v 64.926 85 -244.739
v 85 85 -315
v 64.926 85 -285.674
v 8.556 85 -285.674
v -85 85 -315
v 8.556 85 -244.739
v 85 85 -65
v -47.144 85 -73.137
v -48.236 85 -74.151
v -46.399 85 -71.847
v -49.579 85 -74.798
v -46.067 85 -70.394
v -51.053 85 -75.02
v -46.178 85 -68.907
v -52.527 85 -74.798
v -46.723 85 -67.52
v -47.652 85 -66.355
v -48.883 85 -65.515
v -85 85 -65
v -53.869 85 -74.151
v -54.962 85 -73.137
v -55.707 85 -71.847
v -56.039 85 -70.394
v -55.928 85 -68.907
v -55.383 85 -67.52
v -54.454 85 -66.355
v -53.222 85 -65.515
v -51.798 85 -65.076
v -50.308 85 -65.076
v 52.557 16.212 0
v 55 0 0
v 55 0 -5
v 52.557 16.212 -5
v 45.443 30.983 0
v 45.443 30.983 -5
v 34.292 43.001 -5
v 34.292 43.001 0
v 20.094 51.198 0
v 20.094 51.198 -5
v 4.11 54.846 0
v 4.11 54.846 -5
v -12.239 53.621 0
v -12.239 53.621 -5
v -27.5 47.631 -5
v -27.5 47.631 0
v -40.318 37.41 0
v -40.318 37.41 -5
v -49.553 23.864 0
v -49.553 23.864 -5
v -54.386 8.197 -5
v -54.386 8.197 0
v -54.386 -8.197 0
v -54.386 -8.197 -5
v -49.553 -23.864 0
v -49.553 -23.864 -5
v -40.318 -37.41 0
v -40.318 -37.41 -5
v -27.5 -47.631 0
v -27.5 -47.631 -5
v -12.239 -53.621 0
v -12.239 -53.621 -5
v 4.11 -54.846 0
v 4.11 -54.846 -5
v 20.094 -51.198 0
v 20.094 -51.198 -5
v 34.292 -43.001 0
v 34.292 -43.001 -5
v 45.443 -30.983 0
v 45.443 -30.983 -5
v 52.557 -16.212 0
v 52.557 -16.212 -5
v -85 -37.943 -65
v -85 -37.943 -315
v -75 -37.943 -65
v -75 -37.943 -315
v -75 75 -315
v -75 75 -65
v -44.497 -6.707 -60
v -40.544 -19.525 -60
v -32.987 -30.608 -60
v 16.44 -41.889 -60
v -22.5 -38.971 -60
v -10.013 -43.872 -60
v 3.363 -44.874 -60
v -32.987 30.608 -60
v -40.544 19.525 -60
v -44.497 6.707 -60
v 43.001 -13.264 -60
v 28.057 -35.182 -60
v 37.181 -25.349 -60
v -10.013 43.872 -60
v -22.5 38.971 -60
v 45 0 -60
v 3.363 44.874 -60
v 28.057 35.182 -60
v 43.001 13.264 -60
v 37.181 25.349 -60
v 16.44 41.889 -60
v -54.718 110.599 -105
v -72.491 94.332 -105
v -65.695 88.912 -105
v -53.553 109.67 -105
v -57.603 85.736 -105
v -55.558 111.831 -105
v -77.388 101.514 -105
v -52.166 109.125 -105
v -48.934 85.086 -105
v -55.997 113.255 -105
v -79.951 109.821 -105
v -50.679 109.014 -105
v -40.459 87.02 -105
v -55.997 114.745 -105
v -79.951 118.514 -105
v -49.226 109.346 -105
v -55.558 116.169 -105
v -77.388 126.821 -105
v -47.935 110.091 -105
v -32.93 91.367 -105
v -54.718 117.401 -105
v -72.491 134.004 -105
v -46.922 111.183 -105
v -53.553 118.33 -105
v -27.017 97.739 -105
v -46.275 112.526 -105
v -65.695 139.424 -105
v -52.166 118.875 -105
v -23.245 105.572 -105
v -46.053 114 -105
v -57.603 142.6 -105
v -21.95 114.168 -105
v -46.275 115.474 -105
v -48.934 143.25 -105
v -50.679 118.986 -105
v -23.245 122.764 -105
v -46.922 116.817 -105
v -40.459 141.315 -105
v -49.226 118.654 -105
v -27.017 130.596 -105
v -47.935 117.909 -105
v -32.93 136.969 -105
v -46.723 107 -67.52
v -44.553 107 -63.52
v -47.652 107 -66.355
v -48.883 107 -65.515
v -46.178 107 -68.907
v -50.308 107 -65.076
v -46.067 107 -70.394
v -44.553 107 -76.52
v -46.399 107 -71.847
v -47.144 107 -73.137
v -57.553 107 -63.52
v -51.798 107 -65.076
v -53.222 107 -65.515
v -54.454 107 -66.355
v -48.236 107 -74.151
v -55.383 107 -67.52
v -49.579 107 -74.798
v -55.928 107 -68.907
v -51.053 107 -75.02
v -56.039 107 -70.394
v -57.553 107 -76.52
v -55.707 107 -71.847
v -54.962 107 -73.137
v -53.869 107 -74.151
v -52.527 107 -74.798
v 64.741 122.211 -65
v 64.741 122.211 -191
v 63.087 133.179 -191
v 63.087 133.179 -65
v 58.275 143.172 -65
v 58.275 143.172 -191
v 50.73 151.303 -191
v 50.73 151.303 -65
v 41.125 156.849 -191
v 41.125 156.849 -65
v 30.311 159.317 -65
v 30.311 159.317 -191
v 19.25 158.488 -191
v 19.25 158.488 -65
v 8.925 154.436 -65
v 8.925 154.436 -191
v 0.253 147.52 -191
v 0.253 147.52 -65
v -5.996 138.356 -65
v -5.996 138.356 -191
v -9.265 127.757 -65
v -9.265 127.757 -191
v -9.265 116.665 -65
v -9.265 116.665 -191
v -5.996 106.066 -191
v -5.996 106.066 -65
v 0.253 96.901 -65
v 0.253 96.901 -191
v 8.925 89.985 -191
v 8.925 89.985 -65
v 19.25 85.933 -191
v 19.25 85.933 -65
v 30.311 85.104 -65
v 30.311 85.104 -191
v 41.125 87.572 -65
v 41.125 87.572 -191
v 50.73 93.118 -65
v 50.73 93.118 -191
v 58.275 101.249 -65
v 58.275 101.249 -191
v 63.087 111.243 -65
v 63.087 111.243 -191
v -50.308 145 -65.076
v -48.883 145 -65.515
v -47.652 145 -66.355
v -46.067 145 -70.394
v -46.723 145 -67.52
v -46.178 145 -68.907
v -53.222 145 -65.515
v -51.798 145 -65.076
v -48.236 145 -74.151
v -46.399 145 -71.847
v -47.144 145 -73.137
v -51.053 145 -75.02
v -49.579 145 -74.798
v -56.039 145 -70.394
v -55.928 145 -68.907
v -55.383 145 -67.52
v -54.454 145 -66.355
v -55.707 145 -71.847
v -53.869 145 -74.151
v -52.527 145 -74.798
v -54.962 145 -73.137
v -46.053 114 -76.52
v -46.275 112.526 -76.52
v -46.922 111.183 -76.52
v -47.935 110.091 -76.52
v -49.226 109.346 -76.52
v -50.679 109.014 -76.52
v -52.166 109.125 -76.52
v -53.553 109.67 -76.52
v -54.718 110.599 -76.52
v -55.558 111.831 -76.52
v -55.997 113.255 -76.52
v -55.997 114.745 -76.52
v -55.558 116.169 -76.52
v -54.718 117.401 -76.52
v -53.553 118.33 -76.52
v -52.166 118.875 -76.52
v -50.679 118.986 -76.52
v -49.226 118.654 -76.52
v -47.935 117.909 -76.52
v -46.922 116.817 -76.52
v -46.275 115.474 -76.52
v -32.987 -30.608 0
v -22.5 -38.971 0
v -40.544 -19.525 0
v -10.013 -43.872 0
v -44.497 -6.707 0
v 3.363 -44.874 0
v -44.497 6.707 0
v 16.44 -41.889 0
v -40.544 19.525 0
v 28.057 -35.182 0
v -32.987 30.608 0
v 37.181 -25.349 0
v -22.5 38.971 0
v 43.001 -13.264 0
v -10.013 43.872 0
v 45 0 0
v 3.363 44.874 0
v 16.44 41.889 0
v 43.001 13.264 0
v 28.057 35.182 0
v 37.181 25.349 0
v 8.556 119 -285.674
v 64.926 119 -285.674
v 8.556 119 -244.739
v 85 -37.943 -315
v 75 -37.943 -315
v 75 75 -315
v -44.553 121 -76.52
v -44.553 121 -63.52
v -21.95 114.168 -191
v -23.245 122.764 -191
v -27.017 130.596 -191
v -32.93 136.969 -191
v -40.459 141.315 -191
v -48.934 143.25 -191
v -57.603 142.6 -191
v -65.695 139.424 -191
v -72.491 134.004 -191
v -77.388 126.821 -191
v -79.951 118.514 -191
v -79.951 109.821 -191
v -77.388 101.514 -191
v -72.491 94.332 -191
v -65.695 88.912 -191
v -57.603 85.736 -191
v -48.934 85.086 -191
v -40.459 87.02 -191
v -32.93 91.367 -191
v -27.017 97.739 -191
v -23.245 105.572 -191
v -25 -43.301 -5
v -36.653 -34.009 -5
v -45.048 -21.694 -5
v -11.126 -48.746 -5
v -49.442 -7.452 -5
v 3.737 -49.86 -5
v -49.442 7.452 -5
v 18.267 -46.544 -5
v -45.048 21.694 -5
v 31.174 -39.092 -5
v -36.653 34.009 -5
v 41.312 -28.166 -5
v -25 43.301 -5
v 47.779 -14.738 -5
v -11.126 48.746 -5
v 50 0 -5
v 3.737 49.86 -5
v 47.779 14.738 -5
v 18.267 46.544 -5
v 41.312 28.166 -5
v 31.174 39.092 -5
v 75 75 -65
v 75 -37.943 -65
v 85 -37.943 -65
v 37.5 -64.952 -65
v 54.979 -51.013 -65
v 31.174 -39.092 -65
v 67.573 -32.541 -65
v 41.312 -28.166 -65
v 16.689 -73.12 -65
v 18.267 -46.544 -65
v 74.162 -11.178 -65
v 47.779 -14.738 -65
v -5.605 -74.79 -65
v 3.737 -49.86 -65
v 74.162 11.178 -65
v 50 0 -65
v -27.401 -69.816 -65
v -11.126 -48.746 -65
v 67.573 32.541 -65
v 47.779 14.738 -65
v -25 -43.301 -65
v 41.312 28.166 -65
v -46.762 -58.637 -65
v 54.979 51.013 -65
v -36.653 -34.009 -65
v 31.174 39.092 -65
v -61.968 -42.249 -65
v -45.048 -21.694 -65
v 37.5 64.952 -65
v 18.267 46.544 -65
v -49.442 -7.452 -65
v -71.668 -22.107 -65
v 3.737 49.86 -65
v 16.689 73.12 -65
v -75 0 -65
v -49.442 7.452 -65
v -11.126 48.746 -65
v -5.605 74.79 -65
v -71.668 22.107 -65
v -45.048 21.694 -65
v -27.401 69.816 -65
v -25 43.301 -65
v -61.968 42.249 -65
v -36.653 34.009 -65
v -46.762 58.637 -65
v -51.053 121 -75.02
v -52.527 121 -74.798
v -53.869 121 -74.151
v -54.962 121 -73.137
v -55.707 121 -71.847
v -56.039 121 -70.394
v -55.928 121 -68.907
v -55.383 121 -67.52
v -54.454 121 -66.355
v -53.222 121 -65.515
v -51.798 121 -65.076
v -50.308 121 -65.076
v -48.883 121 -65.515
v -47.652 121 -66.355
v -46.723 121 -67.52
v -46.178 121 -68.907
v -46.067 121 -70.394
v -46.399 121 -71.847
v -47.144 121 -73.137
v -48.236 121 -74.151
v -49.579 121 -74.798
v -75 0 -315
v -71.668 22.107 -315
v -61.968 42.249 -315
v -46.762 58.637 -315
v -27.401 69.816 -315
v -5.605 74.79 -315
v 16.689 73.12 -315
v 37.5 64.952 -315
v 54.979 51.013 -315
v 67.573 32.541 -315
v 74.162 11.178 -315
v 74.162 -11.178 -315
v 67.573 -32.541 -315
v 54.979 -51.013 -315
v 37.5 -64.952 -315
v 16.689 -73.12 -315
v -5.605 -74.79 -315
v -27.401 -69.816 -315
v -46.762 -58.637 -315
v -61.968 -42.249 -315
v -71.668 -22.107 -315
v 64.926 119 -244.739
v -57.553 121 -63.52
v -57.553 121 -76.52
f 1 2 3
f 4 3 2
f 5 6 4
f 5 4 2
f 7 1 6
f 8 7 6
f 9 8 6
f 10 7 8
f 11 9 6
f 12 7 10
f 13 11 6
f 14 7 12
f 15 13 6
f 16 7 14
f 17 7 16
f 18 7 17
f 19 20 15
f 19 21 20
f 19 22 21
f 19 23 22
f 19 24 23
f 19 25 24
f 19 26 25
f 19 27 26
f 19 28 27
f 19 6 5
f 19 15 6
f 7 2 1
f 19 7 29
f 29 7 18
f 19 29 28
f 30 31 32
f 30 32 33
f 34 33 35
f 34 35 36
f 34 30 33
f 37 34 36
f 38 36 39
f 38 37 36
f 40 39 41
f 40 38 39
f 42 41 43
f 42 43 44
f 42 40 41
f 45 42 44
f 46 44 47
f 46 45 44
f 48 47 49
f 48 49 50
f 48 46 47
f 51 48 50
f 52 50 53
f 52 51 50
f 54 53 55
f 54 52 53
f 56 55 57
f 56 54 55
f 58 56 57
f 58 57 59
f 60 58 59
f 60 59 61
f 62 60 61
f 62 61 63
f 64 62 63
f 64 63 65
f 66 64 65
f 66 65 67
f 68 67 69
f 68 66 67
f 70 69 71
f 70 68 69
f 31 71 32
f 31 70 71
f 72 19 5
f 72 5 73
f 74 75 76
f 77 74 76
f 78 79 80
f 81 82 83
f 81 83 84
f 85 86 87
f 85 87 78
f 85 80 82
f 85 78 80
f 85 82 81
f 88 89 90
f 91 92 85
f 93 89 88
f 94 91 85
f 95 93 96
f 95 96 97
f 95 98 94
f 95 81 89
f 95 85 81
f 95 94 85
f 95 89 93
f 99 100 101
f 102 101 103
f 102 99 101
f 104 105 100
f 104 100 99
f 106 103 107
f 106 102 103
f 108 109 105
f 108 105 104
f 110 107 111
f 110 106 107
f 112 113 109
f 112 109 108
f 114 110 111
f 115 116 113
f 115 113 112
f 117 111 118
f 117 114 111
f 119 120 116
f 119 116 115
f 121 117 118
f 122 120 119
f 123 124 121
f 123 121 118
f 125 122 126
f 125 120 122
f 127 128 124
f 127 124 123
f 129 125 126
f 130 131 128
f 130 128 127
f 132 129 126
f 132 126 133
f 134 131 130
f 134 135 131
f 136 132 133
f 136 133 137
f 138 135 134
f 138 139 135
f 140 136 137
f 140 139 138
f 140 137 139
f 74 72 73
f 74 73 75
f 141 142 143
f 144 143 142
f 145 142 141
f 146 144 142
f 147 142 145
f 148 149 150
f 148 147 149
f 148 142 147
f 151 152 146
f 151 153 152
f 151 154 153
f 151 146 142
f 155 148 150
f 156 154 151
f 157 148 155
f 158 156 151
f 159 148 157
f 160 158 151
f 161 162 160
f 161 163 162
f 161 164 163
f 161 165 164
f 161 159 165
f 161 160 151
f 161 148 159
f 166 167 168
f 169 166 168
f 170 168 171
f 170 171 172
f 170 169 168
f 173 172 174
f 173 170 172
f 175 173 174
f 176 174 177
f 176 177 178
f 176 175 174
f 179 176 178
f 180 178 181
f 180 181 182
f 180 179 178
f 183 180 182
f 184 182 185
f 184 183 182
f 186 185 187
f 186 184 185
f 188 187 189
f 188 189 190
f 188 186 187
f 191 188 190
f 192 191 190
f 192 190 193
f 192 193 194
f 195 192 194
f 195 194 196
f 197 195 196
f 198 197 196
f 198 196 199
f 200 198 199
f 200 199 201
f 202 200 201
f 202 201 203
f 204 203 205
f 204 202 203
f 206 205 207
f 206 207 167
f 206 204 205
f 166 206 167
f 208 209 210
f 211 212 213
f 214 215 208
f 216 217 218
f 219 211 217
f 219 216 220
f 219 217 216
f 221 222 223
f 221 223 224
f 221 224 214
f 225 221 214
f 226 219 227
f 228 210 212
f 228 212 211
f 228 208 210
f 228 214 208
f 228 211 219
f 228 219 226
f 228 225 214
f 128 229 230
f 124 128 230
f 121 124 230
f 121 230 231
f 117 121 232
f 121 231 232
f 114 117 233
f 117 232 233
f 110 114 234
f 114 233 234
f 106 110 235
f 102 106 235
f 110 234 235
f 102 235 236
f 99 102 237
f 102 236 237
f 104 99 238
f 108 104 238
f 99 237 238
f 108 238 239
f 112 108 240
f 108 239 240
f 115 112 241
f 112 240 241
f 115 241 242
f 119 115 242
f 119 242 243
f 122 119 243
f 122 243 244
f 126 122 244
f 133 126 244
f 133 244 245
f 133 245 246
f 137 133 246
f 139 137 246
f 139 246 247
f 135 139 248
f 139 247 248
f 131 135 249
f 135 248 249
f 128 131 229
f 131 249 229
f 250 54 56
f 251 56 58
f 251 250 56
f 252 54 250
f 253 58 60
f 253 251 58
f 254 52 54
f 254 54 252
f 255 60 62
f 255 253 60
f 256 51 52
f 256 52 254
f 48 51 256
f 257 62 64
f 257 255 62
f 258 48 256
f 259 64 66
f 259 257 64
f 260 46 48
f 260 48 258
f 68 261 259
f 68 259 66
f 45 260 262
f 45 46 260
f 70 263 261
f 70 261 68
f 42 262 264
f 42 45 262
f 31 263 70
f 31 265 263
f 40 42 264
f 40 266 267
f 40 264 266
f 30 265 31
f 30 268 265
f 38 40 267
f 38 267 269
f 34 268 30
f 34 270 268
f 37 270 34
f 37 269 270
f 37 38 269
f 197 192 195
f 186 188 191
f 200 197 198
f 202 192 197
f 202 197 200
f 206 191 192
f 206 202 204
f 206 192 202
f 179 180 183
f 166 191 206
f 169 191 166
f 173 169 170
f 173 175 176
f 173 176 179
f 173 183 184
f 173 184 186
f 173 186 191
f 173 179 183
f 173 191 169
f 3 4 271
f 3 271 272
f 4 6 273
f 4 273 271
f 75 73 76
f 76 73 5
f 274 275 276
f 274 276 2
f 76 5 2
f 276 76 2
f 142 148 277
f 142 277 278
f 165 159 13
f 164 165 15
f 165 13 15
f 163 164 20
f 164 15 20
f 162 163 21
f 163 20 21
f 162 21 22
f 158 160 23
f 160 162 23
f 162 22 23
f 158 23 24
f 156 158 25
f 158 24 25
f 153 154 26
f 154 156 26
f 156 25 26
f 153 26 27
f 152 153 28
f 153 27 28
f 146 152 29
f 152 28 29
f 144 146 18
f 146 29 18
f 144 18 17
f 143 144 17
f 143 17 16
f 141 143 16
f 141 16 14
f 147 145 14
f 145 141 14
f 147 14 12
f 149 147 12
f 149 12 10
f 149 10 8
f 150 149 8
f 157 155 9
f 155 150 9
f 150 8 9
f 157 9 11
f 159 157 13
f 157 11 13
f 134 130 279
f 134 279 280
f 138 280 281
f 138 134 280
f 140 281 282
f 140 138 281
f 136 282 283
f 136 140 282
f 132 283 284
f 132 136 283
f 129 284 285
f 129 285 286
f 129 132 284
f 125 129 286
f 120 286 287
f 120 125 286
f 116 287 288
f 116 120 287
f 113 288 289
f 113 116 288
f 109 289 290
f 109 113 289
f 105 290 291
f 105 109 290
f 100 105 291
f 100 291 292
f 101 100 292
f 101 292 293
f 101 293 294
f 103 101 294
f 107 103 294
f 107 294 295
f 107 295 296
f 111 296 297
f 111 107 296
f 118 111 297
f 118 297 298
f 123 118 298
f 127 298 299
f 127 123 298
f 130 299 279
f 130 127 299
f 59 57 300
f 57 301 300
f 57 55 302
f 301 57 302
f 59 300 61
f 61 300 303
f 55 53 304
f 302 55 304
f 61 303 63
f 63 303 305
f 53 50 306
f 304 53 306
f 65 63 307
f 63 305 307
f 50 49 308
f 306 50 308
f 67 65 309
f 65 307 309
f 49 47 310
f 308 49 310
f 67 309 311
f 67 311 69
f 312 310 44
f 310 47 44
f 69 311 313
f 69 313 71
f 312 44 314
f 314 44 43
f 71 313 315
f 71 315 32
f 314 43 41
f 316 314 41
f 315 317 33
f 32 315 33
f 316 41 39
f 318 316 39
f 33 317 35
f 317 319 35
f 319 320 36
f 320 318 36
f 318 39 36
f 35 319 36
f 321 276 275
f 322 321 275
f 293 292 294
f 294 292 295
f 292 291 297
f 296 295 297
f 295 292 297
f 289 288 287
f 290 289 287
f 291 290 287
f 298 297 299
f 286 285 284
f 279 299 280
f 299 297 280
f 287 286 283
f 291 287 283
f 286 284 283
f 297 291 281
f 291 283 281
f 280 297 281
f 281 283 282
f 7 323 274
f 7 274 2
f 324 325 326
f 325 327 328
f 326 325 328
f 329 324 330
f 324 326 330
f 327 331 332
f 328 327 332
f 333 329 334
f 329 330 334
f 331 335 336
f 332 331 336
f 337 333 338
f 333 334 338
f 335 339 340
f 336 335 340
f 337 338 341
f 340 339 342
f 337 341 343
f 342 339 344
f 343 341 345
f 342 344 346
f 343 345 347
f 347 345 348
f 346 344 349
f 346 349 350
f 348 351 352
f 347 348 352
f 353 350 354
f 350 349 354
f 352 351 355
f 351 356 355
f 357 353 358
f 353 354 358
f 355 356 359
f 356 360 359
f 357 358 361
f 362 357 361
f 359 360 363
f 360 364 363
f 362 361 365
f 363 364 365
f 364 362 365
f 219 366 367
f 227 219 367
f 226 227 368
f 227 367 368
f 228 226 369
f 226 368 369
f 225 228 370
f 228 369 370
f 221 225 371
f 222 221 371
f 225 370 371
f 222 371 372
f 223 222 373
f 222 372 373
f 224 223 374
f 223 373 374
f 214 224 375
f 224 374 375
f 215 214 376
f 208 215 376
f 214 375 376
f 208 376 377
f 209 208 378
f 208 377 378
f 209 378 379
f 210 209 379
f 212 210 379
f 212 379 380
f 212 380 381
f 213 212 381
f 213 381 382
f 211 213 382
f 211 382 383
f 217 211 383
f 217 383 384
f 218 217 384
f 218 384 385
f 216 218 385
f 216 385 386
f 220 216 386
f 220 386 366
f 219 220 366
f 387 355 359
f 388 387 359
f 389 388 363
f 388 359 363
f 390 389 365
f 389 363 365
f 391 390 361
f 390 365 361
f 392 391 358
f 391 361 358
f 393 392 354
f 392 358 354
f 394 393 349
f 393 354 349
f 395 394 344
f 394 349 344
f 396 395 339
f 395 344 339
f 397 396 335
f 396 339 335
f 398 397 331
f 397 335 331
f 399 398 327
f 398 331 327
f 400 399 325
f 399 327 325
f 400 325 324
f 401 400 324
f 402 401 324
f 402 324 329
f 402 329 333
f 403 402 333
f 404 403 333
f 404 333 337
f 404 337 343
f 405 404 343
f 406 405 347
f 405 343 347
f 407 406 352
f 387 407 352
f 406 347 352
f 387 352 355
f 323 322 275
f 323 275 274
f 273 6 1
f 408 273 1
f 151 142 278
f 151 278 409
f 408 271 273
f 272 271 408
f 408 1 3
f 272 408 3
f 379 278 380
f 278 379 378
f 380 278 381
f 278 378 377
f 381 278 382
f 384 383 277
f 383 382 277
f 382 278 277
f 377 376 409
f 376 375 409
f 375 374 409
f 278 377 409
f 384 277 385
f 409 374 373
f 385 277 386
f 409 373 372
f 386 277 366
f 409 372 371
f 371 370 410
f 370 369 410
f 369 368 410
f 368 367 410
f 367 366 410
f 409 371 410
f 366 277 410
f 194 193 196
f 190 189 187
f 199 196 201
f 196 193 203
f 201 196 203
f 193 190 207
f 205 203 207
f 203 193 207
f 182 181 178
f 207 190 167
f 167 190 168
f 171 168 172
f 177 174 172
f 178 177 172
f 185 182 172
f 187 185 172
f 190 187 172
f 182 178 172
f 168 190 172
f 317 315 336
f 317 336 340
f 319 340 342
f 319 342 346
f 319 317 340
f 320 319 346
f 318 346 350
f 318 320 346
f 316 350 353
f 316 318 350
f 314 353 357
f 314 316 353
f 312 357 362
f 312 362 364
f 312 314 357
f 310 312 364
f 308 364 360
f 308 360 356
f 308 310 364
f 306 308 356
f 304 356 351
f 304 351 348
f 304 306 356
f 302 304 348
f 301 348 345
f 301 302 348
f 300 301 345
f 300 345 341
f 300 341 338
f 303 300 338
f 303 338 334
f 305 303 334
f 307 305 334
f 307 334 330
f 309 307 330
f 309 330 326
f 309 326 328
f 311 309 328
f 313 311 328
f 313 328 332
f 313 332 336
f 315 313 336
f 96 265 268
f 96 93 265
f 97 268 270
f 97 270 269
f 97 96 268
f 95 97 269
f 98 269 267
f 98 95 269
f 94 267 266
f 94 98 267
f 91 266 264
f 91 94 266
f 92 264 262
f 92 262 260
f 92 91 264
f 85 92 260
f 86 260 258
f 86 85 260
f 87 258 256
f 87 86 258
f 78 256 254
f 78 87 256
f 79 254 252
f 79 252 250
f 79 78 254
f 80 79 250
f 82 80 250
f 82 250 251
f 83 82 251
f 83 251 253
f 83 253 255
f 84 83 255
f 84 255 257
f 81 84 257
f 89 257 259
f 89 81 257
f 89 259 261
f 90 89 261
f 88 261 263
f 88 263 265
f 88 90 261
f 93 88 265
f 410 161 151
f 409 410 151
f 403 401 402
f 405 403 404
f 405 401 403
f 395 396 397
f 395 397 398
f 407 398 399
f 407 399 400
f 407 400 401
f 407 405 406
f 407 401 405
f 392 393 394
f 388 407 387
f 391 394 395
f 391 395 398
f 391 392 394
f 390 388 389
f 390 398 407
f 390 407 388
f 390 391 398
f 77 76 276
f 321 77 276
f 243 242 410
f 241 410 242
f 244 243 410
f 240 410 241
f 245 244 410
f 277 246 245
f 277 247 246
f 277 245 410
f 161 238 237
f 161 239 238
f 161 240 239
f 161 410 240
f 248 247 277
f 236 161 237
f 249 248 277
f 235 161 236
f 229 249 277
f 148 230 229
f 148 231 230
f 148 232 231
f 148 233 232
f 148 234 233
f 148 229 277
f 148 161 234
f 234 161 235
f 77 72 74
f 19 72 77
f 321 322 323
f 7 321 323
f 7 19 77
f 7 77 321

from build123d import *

# Parameters (mm, degrees)
SKETCH1_R                 = 50
BOSS_EXTRUDE1_DEPTH       = 65
SHELL1_T                  = -5
SKETCH3_R                 = 55
BOSS_EXTRUDE2_DEPTH       = 5
SHELL2_START              = -5
SHELL2_OUTLINE_R          = 45
SHELL2_DEPTH              = 5
SKETCH5_R                 = 75
BOSS_EXTRUDE3_DEPTH       = 250
BOSS_EXTRUDE4_DEPTH       = 250
SKETCH9_R                 = 37.210694341
BOSS_EXTRUDE5_DEPTH       = 126
SKETCH10_W                = 56.36992765
SKETCH10_H                = 40.935304603
BOSS_EXTRUDE6_DEPTH       = 34
SKETCH12_R                = 29.163363005
BOSS_EXTRUDE7_DEPTH       = 86
SKETCH16_R                = 5
BOSS_EXTRUDE10_DEPTH      = 60
BOSS_EXTRUDE11_DEPTH      = 7
BOSS_EXTRUDE11_DEPTH_BACK = 7
SKETCH19_R                = 5
BOSS_EXTRUDE12_DEPTH      = 28.48


# Read off the part's stored shape, not the designer's step: Shell2
with BuildPart() as part:
    # Sketch1 → Boss-Extrude1 (new body)
    with BuildSketch(Plane.XY):
        Circle(SKETCH1_R)
    extrude(amount=-BOSS_EXTRUDE1_DEPTH)

    # Shell1
    shell1_openings = [part.faces().sort_by_distance(p)[0] for p in [
        (0, 0, 0),
    ]]
    offset(amount=SHELL1_T, openings=shell1_openings, kind=Kind.INTERSECTION)

    # Sketch3 → Boss-Extrude2 (add)
    with BuildSketch(Plane.XY):
        Circle(SKETCH3_R)
    extrude(amount=-BOSS_EXTRUDE2_DEPTH)

    # Shell2 outline → Shell2 (cut)
    with BuildSketch(Plane.XY.offset(SHELL2_START)):
        Circle(SHELL2_OUTLINE_R)
    extrude(amount=SHELL2_DEPTH, mode=Mode.SUBTRACT)

    # Sketch5 → Boss-Extrude3 (add)
    with BuildSketch(Plane(origin=(0, 0, -65), x_dir=(-1, 0, 0), z_dir=(0, 0, -1))):
        Circle(SKETCH5_R)
    extrude(amount=BOSS_EXTRUDE3_DEPTH)


with BuildPart() as body_2:
    # Sketch6 → Boss-Extrude4 (new body)
    with BuildSketch(Plane.XY.offset(-65)):
        Polygon((75, -37.942743418), (85, -37.942743418), (85, 85), (-85, 85), (-85, -37.942743418), (-75, -37.942743418), (-75, 75), (75, 75), align=None)
    extrude(amount=-BOSS_EXTRUDE4_DEPTH)

    # Sketch10 → Boss-Extrude6 (add)
    with BuildSketch(Plane(origin=(0, 85, 0), x_dir=(1, 0, 0), z_dir=(0, 1, 0))):
        with Locations((36.741113558, 265.206826046)):
            Rectangle(SKETCH10_W, SKETCH10_H)
    extrude(amount=BOSS_EXTRUDE6_DEPTH)

    # Sketch16 → Boss-Extrude10 (add)
    with BuildSketch(Plane(origin=(0, 85, 0), x_dir=(1, 0, 0), z_dir=(0, 1, 0))):
        with Locations(Location((-51.052896517, 70.02, 0), (0, 0, 90))):
            Circle(SKETCH16_R)
    extrude(amount=BOSS_EXTRUDE10_DEPTH)

    # Sketch18 → Boss-Extrude11 (add, two sides: drawn at the far end of the back side and taken through both)
    with BuildSketch(Plane(origin=(0, 114, 0), x_dir=(1, 0, 0), z_dir=(0, 1, 0)).offset(-BOSS_EXTRUDE11_DEPTH_BACK)):
        Polygon((-57.552896517, 70.02), (-57.552896517, 76.52), (-44.552896517, 76.52), (-44.552896517, 63.52), (-57.552896517, 63.52), align=None)
    extrude(amount=BOSS_EXTRUDE11_DEPTH + BOSS_EXTRUDE11_DEPTH_BACK)



with BuildPart() as body_3:
    # Sketch9 → Boss-Extrude5 (new body)
    with BuildSketch(Plane.XY.offset(-65)):
        with Locations((27.529934173, 122.210694341)):
            Circle(SKETCH9_R)
    extrude(amount=-BOSS_EXTRUDE5_DEPTH)


with BuildPart() as body_4:
    # Sketch12 → Boss-Extrude7 (new body)
    with BuildSketch(Plane.XY.offset(-105)):
        with Locations((-51.113194065, 114.167789901)):
            Circle(SKETCH12_R)
    extrude(amount=-BOSS_EXTRUDE7_DEPTH)


with BuildPart() as body_2_1:
    add(body_2.part)

    add(body_4.part)  # Boss-Extrude12 merges body 4
    # Sketch19 → Boss-Extrude12 (add)
    with BuildSketch(Plane(origin=(0, 0, -76.52), x_dir=(-1, 0, 0), z_dir=(0, 0, -1))):
        with Locations(Location((51.052896517, 114, 0), (0, 0, 180))):
            Circle(SKETCH19_R)
    extrude(amount=BOSS_EXTRUDE12_DEPTH)


solid = Compound([part.part, body_3.part, body_2_1.part])
